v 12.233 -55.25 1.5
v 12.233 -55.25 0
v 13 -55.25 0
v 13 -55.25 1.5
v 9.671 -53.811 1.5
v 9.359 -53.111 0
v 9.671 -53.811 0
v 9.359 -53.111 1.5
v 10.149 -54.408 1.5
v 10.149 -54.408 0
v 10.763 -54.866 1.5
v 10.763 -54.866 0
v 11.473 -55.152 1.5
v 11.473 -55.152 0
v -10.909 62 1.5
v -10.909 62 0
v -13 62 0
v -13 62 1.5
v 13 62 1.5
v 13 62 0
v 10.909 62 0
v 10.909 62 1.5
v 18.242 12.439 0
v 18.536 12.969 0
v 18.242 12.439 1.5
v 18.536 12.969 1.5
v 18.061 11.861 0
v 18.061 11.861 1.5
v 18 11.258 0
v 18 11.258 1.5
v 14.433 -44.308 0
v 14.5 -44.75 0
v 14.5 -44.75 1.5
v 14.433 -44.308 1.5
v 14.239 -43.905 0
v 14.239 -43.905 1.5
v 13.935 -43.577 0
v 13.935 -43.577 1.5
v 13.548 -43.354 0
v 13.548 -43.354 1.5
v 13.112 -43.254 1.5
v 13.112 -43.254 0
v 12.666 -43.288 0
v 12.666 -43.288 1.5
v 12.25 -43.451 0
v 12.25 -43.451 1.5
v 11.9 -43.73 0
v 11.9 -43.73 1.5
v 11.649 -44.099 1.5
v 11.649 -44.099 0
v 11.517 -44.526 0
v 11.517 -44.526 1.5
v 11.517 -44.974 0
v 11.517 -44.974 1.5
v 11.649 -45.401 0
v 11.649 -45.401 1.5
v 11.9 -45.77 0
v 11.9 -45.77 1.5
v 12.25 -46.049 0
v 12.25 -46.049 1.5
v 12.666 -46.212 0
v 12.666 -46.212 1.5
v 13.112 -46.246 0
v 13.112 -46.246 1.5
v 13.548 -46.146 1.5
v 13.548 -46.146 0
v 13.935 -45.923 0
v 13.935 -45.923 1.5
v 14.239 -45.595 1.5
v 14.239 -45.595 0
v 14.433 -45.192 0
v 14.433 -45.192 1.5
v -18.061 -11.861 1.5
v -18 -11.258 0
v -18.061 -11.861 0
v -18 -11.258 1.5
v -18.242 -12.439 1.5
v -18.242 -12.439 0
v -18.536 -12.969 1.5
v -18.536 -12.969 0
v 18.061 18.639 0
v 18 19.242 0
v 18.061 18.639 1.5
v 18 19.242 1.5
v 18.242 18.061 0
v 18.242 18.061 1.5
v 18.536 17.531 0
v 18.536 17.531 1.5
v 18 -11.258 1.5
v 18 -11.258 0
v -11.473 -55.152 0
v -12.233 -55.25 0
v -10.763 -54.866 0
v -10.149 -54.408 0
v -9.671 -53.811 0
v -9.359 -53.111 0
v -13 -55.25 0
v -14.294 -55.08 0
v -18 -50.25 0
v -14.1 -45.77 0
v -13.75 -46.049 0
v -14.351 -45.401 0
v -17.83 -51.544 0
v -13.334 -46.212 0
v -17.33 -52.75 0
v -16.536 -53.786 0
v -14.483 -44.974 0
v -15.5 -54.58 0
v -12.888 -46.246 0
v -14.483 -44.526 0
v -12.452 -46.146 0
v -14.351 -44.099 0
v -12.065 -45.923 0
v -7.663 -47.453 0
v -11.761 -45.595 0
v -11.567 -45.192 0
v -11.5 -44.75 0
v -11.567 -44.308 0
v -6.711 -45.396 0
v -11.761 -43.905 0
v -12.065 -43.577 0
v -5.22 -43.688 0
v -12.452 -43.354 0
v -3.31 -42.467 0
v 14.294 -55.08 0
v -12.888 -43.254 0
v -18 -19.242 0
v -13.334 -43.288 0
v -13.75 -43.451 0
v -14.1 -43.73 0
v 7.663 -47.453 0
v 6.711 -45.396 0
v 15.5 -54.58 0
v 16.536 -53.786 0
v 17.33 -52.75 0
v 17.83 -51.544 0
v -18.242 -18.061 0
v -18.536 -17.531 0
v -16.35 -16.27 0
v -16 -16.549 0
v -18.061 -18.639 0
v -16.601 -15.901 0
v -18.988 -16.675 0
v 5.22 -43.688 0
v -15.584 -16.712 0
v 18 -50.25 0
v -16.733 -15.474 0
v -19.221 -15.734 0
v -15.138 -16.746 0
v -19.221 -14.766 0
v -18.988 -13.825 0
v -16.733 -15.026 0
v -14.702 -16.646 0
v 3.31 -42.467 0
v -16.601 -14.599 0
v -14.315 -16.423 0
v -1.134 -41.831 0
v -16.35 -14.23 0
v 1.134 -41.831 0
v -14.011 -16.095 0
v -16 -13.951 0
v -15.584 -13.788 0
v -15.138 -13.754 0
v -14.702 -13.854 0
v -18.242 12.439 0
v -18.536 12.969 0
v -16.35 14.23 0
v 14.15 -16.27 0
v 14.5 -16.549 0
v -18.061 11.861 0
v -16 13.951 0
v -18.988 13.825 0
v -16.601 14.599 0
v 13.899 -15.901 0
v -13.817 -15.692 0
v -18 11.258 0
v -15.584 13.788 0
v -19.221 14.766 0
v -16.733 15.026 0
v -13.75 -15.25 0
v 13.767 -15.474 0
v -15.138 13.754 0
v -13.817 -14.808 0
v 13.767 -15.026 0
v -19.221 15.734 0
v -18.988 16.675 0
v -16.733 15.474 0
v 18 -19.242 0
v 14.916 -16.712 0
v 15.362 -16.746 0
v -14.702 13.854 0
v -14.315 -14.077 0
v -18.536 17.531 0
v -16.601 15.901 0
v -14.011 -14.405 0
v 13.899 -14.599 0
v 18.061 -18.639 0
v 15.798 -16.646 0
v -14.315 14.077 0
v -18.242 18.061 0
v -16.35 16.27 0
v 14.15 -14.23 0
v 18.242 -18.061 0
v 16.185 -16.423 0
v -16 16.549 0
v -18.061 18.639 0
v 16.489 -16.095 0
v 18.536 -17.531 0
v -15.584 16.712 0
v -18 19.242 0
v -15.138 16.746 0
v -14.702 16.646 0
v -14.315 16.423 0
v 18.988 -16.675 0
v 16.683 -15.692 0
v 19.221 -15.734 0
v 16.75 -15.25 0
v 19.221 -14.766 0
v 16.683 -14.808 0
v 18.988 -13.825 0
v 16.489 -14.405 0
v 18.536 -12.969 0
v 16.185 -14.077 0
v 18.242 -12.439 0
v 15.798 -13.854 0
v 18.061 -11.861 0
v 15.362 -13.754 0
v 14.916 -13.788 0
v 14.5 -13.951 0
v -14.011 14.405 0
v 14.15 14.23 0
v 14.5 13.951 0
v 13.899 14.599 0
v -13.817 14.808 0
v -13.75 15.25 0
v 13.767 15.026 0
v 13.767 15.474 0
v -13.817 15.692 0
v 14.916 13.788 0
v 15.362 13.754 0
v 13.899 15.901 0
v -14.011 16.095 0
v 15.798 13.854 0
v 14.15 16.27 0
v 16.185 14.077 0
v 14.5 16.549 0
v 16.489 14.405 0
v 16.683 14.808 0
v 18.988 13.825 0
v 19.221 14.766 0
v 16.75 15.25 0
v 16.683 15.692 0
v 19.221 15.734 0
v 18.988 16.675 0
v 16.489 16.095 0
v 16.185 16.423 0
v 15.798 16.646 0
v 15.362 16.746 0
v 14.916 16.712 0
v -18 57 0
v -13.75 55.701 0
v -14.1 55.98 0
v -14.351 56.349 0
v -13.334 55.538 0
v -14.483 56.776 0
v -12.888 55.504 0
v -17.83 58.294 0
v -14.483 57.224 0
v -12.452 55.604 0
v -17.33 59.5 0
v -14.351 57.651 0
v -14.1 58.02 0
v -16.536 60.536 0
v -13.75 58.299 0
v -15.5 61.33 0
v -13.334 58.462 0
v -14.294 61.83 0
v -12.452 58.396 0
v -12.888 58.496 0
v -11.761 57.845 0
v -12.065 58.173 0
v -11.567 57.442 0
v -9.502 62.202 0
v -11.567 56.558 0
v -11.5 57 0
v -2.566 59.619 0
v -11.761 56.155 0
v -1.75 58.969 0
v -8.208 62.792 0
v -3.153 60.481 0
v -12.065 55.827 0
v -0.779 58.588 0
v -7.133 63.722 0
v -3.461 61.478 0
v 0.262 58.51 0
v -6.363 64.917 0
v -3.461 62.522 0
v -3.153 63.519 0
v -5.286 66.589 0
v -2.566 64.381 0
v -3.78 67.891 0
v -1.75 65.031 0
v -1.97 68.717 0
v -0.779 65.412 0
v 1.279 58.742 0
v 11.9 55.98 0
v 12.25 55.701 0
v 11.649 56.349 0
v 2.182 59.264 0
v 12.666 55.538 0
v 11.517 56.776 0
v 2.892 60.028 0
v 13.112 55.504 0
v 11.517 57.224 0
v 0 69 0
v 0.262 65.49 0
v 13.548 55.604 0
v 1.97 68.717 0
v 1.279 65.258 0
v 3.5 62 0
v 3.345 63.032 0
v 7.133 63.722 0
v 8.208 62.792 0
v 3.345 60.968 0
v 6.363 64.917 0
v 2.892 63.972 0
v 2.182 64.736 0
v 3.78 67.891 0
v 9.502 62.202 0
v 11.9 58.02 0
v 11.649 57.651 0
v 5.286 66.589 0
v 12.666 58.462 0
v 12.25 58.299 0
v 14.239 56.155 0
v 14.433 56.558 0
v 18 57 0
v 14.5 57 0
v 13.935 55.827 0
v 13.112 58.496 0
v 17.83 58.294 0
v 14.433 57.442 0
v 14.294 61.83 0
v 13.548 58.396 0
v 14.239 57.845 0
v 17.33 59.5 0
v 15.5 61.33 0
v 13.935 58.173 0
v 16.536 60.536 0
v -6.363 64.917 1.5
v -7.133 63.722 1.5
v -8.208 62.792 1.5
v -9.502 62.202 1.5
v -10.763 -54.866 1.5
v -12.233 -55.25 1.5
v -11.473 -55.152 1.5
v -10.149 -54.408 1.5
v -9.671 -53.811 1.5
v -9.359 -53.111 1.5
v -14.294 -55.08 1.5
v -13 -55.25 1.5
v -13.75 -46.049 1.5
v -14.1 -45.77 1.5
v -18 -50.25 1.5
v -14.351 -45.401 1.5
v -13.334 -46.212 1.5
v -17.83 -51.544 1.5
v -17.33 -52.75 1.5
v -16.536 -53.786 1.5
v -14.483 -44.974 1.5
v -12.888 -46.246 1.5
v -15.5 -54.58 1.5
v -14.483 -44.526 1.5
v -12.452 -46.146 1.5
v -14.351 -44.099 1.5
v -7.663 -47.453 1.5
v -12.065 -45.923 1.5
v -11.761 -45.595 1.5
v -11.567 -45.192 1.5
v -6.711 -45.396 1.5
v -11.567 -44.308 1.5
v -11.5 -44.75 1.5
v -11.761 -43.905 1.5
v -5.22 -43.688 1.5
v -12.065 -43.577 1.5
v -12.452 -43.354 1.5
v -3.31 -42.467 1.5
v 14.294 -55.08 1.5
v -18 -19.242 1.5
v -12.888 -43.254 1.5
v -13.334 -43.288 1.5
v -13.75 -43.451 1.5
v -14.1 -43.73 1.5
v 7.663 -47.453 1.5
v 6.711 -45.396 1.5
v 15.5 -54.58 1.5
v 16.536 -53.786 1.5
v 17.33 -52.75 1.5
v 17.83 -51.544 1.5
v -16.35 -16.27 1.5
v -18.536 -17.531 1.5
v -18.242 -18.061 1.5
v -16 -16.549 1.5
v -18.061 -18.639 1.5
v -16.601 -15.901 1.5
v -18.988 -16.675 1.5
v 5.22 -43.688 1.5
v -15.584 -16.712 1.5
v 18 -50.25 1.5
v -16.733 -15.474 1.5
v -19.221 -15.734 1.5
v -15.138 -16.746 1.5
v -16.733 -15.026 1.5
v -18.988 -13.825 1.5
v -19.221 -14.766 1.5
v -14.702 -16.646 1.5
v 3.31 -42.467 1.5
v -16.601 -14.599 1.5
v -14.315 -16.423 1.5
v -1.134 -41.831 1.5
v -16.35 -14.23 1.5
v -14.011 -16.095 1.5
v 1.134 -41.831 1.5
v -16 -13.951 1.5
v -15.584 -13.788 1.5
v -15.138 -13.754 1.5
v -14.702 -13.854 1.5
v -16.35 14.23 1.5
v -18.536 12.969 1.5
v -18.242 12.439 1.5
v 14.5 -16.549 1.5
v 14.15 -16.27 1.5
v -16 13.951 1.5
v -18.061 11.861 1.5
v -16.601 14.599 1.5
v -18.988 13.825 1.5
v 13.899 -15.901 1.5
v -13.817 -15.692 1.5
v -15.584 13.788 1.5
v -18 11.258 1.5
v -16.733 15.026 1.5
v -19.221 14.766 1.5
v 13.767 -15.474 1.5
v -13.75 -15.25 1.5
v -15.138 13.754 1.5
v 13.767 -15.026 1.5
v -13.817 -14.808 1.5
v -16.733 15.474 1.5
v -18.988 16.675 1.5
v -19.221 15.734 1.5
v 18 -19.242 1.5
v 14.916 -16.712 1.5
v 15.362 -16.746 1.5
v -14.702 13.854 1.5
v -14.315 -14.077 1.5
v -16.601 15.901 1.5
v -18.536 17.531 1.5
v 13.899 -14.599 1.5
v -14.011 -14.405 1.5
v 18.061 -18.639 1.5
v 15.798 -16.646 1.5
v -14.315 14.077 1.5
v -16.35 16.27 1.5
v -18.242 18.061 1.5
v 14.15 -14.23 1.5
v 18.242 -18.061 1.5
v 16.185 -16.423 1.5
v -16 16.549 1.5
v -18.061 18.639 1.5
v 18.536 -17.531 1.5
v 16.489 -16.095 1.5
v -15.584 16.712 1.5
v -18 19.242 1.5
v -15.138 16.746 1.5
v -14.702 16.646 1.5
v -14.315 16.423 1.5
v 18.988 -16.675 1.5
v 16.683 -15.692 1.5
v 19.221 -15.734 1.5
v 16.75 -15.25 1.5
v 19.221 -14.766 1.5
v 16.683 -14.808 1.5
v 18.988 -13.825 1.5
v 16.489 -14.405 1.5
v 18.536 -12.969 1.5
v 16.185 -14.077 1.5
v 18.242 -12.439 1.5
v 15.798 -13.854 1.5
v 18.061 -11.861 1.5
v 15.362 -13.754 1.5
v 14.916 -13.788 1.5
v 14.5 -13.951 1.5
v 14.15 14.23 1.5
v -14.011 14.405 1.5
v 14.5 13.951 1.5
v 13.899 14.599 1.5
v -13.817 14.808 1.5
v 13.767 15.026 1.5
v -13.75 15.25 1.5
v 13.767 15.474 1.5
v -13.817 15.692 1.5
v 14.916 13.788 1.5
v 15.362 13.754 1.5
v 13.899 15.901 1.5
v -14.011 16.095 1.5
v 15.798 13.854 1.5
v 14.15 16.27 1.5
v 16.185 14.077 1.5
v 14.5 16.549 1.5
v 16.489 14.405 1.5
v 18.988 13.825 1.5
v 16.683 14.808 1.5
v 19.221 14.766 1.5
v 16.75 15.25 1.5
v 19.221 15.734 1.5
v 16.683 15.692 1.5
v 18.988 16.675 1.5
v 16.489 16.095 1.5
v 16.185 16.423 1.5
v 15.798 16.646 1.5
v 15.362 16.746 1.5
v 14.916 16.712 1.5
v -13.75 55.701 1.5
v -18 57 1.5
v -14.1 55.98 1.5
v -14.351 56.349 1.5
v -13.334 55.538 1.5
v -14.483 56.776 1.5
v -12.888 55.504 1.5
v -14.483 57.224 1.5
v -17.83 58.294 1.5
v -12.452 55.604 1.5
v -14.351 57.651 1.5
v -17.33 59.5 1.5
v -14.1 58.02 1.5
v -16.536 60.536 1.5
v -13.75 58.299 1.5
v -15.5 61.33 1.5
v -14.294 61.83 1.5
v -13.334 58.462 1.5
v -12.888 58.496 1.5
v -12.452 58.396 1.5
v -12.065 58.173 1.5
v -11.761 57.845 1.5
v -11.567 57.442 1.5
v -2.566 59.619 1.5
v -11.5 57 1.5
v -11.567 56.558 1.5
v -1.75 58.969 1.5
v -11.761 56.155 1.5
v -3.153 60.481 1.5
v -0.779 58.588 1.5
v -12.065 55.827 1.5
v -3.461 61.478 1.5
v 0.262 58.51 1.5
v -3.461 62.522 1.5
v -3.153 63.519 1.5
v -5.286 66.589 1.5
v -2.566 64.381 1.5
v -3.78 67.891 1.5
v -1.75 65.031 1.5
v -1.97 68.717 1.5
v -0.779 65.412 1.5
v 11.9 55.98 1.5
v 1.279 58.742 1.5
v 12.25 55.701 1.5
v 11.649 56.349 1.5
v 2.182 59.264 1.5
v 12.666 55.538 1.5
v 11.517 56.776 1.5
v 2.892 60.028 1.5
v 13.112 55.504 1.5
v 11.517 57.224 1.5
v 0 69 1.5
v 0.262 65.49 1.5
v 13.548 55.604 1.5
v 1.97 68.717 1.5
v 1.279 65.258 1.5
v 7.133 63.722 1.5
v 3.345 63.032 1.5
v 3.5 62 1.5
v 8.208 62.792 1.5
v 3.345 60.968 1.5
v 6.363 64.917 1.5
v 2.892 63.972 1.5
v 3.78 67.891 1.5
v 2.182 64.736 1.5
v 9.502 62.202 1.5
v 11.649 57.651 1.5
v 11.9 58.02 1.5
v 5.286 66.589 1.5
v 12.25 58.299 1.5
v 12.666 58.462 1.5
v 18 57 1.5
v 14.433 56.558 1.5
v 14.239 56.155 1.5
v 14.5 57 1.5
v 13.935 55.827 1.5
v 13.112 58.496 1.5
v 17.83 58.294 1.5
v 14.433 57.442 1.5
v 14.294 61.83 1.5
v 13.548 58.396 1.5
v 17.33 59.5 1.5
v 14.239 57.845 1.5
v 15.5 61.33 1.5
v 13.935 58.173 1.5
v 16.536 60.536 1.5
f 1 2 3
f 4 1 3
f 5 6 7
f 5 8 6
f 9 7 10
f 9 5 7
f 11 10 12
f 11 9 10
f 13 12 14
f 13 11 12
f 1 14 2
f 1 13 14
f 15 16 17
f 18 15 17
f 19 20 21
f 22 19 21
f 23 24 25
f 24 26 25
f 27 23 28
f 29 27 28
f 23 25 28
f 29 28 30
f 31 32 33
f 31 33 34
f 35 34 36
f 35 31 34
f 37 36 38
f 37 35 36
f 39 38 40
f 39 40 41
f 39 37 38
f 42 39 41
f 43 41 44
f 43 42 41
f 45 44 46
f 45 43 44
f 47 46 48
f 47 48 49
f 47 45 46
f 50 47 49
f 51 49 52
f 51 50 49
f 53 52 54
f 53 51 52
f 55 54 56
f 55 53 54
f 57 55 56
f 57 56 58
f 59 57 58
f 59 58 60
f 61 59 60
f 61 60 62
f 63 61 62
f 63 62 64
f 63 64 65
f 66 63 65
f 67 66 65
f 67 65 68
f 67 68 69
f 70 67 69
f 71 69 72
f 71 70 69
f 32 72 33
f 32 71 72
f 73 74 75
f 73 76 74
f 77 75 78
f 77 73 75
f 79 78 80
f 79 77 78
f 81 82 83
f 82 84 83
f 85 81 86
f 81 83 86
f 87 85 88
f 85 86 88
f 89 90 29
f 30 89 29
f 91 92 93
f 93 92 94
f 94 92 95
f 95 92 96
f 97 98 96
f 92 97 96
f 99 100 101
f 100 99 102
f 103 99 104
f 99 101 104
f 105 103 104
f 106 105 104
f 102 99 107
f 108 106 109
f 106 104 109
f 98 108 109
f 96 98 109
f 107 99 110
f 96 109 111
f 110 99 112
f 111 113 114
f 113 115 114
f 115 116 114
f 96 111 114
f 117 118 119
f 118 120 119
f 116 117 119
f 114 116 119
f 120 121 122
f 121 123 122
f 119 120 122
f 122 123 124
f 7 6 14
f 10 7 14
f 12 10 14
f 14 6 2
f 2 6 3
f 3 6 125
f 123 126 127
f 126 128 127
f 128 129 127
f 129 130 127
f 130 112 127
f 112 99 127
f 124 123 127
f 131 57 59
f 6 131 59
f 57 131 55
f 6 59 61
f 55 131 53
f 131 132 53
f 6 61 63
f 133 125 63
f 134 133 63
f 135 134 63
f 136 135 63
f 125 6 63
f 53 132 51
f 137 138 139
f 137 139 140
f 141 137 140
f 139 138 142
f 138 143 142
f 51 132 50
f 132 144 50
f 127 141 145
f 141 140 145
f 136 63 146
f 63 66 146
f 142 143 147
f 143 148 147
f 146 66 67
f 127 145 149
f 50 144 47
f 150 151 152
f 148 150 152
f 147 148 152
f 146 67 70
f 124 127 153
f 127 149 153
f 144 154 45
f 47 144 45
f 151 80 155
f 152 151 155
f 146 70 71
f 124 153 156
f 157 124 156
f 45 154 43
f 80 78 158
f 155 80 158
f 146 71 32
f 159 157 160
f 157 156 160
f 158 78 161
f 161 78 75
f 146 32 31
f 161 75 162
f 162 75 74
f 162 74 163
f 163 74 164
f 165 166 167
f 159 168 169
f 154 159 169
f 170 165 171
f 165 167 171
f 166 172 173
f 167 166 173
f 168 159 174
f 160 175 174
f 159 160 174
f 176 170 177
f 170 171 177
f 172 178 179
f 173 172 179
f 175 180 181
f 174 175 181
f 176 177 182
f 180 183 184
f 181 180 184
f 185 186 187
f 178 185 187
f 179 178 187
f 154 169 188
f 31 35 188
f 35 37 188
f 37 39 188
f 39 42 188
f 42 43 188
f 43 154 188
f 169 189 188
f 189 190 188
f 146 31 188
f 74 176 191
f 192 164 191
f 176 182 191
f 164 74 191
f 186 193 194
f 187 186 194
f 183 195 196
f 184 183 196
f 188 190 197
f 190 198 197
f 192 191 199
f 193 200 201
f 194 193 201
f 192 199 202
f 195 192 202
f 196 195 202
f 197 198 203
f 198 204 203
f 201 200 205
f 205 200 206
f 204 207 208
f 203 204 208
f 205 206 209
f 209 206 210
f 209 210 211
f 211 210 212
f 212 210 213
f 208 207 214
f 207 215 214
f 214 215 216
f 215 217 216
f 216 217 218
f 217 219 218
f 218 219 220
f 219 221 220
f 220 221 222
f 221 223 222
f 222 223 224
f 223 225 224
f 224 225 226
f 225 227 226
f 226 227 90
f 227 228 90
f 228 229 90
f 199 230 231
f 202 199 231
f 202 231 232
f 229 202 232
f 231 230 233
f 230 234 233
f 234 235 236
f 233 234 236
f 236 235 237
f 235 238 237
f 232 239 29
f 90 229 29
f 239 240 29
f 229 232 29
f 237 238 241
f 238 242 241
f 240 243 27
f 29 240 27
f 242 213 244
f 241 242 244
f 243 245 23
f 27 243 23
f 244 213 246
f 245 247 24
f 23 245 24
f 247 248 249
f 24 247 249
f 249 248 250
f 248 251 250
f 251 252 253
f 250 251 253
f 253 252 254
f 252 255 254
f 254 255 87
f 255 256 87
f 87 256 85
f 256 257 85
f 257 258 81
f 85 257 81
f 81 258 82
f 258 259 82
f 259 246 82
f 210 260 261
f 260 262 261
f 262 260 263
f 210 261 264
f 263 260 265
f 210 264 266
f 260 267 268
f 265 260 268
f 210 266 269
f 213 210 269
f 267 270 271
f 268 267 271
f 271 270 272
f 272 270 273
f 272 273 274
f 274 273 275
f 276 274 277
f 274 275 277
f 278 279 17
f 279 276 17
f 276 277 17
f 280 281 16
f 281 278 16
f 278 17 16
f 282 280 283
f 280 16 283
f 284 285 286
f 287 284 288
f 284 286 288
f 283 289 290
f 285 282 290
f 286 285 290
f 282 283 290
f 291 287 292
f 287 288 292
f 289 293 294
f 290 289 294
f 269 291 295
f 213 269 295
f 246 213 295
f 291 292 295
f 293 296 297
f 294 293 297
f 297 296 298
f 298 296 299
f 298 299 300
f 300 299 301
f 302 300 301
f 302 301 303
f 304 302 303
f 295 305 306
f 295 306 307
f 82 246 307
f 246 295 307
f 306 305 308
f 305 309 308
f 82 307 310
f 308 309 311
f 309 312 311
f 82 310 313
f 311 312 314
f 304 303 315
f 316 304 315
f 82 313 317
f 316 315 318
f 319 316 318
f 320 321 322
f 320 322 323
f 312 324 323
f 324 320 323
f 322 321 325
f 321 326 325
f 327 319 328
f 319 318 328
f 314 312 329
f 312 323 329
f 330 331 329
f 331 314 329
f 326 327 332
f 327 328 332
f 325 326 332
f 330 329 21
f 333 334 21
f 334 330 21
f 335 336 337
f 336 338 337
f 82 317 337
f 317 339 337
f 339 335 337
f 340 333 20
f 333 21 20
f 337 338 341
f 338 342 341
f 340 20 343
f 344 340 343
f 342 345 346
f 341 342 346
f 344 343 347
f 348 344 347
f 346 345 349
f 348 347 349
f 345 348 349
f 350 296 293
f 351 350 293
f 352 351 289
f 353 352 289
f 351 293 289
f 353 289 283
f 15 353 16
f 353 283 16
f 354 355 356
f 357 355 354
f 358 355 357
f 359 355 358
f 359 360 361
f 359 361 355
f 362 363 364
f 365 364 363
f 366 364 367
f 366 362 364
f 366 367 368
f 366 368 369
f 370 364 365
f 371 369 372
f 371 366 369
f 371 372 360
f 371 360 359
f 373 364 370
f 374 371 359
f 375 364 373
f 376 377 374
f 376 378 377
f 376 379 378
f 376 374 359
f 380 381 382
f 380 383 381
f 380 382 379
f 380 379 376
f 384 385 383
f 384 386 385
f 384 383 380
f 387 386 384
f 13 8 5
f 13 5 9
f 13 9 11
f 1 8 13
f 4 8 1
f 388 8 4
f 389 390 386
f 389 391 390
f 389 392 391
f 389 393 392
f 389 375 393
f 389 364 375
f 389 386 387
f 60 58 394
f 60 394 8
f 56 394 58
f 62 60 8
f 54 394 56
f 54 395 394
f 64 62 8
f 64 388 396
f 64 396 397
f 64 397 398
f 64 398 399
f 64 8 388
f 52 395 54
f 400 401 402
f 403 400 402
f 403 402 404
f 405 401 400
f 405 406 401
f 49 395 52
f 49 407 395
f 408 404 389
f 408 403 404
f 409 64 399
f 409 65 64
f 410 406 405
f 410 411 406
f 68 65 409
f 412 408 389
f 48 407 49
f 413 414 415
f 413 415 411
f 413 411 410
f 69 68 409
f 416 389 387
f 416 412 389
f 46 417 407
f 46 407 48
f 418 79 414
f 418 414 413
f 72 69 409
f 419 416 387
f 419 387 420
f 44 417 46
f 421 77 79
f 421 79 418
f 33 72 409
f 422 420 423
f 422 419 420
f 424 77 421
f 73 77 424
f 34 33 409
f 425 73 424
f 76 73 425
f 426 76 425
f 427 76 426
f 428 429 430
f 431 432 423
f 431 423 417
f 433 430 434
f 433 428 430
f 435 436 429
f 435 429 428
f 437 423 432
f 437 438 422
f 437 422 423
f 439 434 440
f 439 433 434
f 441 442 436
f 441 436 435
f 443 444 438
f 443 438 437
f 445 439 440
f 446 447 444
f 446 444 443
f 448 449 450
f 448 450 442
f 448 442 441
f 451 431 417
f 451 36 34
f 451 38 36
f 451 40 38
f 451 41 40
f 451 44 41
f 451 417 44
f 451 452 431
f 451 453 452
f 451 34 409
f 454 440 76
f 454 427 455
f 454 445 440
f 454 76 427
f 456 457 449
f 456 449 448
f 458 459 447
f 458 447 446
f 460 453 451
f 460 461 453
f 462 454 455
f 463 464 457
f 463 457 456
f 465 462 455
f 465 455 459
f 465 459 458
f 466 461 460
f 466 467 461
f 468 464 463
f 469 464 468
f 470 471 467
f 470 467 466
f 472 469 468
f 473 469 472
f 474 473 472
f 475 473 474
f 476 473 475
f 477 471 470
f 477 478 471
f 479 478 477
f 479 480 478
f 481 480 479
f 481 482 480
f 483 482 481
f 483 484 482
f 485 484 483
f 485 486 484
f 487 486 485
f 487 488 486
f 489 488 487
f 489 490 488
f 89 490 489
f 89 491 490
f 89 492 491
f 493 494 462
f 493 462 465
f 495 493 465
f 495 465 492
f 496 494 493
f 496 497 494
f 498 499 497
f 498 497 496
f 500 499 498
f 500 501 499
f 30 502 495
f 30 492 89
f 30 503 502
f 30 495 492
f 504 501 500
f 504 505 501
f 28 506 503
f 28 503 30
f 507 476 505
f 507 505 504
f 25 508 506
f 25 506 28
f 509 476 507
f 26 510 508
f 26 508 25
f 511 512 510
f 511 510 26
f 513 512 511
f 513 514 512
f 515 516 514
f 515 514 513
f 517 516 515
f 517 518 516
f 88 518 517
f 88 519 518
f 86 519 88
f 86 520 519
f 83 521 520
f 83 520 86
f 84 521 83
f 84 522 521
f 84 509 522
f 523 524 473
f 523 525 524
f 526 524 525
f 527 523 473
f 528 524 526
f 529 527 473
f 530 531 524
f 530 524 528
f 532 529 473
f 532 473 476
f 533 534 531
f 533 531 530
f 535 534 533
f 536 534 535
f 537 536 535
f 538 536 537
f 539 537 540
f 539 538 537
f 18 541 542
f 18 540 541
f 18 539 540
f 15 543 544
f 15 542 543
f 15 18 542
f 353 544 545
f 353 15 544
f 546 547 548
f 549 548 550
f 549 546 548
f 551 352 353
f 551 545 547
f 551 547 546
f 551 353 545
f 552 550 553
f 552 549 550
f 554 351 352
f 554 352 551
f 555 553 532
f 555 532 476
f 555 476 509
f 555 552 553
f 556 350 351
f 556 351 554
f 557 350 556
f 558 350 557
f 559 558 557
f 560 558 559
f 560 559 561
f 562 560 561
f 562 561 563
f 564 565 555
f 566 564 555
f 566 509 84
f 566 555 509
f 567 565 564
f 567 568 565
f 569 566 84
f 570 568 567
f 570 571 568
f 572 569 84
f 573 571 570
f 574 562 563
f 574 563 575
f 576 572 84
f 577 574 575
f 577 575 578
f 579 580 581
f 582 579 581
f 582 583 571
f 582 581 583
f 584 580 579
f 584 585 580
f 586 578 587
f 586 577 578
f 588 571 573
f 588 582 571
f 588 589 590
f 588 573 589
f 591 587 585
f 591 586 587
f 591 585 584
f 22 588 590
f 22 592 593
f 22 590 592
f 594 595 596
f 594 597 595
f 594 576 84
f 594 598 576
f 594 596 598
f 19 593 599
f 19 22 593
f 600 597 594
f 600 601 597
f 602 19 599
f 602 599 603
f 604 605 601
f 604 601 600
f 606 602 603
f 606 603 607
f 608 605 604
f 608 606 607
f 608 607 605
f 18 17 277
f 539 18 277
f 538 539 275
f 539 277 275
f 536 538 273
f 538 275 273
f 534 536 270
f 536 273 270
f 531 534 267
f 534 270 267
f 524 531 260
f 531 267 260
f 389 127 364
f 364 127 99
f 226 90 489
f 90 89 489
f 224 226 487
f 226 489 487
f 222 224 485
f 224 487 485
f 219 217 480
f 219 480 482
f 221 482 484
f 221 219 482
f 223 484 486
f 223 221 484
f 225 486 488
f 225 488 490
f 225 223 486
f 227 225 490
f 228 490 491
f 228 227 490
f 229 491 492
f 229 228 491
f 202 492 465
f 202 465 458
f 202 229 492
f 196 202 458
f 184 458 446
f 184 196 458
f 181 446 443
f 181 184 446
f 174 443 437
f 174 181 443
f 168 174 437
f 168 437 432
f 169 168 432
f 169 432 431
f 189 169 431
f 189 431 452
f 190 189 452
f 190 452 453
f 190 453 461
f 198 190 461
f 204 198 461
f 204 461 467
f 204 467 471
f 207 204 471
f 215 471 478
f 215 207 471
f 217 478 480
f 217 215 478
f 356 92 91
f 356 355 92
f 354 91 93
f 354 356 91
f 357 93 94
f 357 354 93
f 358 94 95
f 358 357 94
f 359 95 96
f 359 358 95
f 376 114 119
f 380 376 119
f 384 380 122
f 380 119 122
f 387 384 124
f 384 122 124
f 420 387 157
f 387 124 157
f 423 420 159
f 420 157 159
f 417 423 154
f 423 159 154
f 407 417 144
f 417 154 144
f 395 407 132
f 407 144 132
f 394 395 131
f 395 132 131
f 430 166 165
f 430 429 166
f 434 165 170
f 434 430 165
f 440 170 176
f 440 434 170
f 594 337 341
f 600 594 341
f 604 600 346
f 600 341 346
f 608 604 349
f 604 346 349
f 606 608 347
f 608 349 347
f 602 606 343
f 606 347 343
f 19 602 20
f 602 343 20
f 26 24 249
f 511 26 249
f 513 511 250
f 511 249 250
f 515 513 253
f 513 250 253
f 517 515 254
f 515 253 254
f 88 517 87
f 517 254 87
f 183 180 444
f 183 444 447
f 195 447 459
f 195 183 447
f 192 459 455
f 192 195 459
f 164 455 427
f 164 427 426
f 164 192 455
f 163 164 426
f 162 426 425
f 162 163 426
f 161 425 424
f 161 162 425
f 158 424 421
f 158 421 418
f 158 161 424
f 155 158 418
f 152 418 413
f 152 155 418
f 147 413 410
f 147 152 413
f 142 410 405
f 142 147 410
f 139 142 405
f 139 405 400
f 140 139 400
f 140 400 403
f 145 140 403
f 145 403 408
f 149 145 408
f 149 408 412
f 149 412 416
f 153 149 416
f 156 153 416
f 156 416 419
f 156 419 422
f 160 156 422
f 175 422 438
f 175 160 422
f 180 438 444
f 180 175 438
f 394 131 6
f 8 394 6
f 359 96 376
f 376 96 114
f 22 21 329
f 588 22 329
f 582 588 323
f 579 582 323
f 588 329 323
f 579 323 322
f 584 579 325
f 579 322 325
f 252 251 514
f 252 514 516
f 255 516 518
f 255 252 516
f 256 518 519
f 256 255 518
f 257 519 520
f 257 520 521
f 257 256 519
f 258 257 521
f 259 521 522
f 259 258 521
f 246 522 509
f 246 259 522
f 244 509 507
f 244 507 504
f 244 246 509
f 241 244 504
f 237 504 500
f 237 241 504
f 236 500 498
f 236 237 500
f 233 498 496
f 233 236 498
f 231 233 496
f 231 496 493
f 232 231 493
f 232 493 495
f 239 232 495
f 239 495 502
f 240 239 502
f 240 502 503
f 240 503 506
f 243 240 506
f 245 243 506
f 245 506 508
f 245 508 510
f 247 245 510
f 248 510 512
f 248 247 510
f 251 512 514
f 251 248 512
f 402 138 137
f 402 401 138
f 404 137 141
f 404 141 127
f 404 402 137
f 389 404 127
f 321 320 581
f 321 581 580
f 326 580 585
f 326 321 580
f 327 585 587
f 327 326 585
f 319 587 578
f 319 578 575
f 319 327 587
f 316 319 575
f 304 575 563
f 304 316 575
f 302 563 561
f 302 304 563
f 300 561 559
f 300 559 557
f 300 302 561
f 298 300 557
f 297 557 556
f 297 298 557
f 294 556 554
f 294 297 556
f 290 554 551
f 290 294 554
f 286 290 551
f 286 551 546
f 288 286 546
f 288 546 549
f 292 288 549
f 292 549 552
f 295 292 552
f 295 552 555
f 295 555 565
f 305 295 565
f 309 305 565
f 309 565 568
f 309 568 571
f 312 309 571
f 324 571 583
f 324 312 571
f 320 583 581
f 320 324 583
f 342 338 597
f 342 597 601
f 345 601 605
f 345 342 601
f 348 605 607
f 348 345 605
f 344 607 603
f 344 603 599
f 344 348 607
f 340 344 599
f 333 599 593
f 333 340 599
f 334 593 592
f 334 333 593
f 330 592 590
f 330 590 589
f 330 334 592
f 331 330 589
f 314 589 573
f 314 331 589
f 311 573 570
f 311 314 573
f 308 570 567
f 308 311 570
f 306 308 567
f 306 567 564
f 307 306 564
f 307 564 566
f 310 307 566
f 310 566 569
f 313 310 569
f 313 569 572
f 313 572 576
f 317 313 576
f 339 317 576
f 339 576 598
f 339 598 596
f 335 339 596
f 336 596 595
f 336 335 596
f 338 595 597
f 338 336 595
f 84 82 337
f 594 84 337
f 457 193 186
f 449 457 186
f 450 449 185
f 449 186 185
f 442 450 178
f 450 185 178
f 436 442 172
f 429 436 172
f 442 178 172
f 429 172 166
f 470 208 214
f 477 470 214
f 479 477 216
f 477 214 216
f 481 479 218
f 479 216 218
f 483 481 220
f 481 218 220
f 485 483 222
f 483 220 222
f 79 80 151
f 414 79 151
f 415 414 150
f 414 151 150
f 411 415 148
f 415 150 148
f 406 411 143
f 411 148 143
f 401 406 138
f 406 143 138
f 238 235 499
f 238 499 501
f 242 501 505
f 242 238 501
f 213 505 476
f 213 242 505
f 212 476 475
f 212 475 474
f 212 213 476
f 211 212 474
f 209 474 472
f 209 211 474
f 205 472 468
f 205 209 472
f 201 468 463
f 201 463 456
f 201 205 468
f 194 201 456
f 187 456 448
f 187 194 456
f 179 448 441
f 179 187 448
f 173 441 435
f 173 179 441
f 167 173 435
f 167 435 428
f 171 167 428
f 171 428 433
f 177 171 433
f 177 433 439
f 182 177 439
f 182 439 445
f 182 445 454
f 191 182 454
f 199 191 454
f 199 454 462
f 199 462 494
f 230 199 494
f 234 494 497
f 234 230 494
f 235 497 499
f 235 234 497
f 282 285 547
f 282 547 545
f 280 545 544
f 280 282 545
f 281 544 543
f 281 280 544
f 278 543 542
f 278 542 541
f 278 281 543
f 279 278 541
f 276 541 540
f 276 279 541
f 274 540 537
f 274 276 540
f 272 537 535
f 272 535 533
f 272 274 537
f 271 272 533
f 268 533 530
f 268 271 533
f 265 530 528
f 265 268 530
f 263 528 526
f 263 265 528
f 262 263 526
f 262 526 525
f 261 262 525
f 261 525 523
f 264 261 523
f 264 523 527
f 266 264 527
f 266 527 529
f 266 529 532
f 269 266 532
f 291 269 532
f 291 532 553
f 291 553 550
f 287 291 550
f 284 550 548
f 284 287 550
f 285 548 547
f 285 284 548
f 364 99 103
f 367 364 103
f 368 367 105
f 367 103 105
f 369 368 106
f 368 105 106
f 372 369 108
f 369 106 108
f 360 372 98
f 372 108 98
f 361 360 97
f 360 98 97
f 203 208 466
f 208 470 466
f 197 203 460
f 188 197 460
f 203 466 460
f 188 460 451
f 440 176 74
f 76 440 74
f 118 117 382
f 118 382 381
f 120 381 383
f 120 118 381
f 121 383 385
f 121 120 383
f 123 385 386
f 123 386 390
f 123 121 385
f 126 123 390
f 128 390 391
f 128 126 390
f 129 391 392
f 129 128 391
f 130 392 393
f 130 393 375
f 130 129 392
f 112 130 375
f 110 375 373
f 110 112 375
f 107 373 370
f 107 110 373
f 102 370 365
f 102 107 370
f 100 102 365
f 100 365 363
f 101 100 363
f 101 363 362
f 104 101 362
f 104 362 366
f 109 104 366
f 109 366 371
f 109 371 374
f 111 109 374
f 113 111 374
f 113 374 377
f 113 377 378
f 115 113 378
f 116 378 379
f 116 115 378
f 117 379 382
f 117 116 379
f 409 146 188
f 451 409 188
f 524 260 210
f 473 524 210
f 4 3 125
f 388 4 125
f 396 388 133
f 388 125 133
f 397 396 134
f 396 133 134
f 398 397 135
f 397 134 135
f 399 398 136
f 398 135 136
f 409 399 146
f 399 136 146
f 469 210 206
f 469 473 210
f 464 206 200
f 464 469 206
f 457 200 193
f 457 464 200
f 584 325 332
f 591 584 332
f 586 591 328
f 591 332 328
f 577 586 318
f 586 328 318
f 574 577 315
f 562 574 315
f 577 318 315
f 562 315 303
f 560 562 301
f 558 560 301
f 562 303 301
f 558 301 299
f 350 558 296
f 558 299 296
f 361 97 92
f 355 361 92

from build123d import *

# Parameters (mm, degrees)
F0_R     = 1.5
F0_R_2   = 3.5
F1_DEPTH = 1.5
F2_R     = 3


with BuildPart() as f1:
    # F0 (on Top) → F1 (new body)
    with BuildSketch(Plane.XY):
        with BuildLine():
            ThreePointArc((-13, 62), (-16.535534, 60.535534), (-18, 57))
            Line((-18, 57), (-18, 18.154738))
            ThreePointArc((-18, 18.154738), (-19.25, 15.25), (-18, 12.345262))
            Line((-18, 12.345262), (-18, -12.345262))
            ThreePointArc((-18, -12.345262), (-19.25, -15.25), (-18, -18.154738))
            Line((-18, -18.154738), (-18, -50.25))
            ThreePointArc((-18, -50.25), (-16.535534, -53.785534), (-13, -55.25))
            Line((-13, -55.25), (-10, -55.25))
            Line((-10, -55.25), (-7.663217, -47.453241))
            ThreePointArc((-7.663217, -47.453241), (0, -41.75), (7.663217, -47.453241))
            Line((7.663217, -47.453241), (10, -55.25))
            Line((10, -55.25), (13, -55.25))
            ThreePointArc((13, -55.25), (16.535534, -53.785534), (18, -50.25))
            Line((18, -50.25), (18, -18.154738))
            ThreePointArc((18, -18.154738), (19.25, -15.25), (18, -12.345262))
            Line((18, -12.345262), (18, 12.345262))
            ThreePointArc((18, 12.345262), (19.25, 15.25), (18, 18.154738))
            Line((18, 18.154738), (18, 57))
            ThreePointArc((18, 57), (16.535534, 60.535534), (13, 62))
            Line((13, 62), (10.908712, 62))
            ThreePointArc((10.908712, 62), (8.208403, 62.791873), (6.363415, 64.916667))
            ThreePointArc((6.363415, 64.916667), (0, 69), (-6.363415, 64.916667))
            ThreePointArc((-6.363415, 64.916667), (-8.208403, 62.791873), (-10.908712, 62))
            Line((-10.908712, 62), (-13, 62))
        make_face()
        with Locations((-13, -44.75)):
            Circle(F0_R, mode=Mode.SUBTRACT)
        with Locations((-15.25, -15.25)):
            Circle(F0_R, mode=Mode.SUBTRACT)
        with Locations((13, -44.75)):
            Circle(F0_R, mode=Mode.SUBTRACT)
        with Locations((15.25, -15.25)):
            Circle(F0_R, mode=Mode.SUBTRACT)
        with Locations((-15.25, 15.25)):
            Circle(F0_R, mode=Mode.SUBTRACT)
        with Locations((-13, 57)):
            Circle(F0_R, mode=Mode.SUBTRACT)
        with Locations((15.25, 15.25)):
            Circle(F0_R, mode=Mode.SUBTRACT)
        with Locations((0, 62)):
            Circle(F0_R_2, mode=Mode.SUBTRACT)
        with Locations((13, 57)):
            Circle(F0_R, mode=Mode.SUBTRACT)
    extrude(amount=F1_DEPTH)

    # F2
    f2_edges = [f1.edges().sort_by_distance(p)[0] for p in [
        (-18, 12.345262, 0.75),
        (-18, 18.154738, 0.75),
        (-18, -12.345262, 0.75),
        (-18, -18.154738, 0.75),
        (18, -18.154738, 0.75),
        (18, -12.345262, 0.75),
        (18, 12.345262, 0.75),
        (18, 18.154738, 0.75),
        (-10, -55.25, 0.75),
        (10, -55.25, 0.75),
    ]]
    fillet(f2_edges, radius=F2_R)


solid = f1.part
